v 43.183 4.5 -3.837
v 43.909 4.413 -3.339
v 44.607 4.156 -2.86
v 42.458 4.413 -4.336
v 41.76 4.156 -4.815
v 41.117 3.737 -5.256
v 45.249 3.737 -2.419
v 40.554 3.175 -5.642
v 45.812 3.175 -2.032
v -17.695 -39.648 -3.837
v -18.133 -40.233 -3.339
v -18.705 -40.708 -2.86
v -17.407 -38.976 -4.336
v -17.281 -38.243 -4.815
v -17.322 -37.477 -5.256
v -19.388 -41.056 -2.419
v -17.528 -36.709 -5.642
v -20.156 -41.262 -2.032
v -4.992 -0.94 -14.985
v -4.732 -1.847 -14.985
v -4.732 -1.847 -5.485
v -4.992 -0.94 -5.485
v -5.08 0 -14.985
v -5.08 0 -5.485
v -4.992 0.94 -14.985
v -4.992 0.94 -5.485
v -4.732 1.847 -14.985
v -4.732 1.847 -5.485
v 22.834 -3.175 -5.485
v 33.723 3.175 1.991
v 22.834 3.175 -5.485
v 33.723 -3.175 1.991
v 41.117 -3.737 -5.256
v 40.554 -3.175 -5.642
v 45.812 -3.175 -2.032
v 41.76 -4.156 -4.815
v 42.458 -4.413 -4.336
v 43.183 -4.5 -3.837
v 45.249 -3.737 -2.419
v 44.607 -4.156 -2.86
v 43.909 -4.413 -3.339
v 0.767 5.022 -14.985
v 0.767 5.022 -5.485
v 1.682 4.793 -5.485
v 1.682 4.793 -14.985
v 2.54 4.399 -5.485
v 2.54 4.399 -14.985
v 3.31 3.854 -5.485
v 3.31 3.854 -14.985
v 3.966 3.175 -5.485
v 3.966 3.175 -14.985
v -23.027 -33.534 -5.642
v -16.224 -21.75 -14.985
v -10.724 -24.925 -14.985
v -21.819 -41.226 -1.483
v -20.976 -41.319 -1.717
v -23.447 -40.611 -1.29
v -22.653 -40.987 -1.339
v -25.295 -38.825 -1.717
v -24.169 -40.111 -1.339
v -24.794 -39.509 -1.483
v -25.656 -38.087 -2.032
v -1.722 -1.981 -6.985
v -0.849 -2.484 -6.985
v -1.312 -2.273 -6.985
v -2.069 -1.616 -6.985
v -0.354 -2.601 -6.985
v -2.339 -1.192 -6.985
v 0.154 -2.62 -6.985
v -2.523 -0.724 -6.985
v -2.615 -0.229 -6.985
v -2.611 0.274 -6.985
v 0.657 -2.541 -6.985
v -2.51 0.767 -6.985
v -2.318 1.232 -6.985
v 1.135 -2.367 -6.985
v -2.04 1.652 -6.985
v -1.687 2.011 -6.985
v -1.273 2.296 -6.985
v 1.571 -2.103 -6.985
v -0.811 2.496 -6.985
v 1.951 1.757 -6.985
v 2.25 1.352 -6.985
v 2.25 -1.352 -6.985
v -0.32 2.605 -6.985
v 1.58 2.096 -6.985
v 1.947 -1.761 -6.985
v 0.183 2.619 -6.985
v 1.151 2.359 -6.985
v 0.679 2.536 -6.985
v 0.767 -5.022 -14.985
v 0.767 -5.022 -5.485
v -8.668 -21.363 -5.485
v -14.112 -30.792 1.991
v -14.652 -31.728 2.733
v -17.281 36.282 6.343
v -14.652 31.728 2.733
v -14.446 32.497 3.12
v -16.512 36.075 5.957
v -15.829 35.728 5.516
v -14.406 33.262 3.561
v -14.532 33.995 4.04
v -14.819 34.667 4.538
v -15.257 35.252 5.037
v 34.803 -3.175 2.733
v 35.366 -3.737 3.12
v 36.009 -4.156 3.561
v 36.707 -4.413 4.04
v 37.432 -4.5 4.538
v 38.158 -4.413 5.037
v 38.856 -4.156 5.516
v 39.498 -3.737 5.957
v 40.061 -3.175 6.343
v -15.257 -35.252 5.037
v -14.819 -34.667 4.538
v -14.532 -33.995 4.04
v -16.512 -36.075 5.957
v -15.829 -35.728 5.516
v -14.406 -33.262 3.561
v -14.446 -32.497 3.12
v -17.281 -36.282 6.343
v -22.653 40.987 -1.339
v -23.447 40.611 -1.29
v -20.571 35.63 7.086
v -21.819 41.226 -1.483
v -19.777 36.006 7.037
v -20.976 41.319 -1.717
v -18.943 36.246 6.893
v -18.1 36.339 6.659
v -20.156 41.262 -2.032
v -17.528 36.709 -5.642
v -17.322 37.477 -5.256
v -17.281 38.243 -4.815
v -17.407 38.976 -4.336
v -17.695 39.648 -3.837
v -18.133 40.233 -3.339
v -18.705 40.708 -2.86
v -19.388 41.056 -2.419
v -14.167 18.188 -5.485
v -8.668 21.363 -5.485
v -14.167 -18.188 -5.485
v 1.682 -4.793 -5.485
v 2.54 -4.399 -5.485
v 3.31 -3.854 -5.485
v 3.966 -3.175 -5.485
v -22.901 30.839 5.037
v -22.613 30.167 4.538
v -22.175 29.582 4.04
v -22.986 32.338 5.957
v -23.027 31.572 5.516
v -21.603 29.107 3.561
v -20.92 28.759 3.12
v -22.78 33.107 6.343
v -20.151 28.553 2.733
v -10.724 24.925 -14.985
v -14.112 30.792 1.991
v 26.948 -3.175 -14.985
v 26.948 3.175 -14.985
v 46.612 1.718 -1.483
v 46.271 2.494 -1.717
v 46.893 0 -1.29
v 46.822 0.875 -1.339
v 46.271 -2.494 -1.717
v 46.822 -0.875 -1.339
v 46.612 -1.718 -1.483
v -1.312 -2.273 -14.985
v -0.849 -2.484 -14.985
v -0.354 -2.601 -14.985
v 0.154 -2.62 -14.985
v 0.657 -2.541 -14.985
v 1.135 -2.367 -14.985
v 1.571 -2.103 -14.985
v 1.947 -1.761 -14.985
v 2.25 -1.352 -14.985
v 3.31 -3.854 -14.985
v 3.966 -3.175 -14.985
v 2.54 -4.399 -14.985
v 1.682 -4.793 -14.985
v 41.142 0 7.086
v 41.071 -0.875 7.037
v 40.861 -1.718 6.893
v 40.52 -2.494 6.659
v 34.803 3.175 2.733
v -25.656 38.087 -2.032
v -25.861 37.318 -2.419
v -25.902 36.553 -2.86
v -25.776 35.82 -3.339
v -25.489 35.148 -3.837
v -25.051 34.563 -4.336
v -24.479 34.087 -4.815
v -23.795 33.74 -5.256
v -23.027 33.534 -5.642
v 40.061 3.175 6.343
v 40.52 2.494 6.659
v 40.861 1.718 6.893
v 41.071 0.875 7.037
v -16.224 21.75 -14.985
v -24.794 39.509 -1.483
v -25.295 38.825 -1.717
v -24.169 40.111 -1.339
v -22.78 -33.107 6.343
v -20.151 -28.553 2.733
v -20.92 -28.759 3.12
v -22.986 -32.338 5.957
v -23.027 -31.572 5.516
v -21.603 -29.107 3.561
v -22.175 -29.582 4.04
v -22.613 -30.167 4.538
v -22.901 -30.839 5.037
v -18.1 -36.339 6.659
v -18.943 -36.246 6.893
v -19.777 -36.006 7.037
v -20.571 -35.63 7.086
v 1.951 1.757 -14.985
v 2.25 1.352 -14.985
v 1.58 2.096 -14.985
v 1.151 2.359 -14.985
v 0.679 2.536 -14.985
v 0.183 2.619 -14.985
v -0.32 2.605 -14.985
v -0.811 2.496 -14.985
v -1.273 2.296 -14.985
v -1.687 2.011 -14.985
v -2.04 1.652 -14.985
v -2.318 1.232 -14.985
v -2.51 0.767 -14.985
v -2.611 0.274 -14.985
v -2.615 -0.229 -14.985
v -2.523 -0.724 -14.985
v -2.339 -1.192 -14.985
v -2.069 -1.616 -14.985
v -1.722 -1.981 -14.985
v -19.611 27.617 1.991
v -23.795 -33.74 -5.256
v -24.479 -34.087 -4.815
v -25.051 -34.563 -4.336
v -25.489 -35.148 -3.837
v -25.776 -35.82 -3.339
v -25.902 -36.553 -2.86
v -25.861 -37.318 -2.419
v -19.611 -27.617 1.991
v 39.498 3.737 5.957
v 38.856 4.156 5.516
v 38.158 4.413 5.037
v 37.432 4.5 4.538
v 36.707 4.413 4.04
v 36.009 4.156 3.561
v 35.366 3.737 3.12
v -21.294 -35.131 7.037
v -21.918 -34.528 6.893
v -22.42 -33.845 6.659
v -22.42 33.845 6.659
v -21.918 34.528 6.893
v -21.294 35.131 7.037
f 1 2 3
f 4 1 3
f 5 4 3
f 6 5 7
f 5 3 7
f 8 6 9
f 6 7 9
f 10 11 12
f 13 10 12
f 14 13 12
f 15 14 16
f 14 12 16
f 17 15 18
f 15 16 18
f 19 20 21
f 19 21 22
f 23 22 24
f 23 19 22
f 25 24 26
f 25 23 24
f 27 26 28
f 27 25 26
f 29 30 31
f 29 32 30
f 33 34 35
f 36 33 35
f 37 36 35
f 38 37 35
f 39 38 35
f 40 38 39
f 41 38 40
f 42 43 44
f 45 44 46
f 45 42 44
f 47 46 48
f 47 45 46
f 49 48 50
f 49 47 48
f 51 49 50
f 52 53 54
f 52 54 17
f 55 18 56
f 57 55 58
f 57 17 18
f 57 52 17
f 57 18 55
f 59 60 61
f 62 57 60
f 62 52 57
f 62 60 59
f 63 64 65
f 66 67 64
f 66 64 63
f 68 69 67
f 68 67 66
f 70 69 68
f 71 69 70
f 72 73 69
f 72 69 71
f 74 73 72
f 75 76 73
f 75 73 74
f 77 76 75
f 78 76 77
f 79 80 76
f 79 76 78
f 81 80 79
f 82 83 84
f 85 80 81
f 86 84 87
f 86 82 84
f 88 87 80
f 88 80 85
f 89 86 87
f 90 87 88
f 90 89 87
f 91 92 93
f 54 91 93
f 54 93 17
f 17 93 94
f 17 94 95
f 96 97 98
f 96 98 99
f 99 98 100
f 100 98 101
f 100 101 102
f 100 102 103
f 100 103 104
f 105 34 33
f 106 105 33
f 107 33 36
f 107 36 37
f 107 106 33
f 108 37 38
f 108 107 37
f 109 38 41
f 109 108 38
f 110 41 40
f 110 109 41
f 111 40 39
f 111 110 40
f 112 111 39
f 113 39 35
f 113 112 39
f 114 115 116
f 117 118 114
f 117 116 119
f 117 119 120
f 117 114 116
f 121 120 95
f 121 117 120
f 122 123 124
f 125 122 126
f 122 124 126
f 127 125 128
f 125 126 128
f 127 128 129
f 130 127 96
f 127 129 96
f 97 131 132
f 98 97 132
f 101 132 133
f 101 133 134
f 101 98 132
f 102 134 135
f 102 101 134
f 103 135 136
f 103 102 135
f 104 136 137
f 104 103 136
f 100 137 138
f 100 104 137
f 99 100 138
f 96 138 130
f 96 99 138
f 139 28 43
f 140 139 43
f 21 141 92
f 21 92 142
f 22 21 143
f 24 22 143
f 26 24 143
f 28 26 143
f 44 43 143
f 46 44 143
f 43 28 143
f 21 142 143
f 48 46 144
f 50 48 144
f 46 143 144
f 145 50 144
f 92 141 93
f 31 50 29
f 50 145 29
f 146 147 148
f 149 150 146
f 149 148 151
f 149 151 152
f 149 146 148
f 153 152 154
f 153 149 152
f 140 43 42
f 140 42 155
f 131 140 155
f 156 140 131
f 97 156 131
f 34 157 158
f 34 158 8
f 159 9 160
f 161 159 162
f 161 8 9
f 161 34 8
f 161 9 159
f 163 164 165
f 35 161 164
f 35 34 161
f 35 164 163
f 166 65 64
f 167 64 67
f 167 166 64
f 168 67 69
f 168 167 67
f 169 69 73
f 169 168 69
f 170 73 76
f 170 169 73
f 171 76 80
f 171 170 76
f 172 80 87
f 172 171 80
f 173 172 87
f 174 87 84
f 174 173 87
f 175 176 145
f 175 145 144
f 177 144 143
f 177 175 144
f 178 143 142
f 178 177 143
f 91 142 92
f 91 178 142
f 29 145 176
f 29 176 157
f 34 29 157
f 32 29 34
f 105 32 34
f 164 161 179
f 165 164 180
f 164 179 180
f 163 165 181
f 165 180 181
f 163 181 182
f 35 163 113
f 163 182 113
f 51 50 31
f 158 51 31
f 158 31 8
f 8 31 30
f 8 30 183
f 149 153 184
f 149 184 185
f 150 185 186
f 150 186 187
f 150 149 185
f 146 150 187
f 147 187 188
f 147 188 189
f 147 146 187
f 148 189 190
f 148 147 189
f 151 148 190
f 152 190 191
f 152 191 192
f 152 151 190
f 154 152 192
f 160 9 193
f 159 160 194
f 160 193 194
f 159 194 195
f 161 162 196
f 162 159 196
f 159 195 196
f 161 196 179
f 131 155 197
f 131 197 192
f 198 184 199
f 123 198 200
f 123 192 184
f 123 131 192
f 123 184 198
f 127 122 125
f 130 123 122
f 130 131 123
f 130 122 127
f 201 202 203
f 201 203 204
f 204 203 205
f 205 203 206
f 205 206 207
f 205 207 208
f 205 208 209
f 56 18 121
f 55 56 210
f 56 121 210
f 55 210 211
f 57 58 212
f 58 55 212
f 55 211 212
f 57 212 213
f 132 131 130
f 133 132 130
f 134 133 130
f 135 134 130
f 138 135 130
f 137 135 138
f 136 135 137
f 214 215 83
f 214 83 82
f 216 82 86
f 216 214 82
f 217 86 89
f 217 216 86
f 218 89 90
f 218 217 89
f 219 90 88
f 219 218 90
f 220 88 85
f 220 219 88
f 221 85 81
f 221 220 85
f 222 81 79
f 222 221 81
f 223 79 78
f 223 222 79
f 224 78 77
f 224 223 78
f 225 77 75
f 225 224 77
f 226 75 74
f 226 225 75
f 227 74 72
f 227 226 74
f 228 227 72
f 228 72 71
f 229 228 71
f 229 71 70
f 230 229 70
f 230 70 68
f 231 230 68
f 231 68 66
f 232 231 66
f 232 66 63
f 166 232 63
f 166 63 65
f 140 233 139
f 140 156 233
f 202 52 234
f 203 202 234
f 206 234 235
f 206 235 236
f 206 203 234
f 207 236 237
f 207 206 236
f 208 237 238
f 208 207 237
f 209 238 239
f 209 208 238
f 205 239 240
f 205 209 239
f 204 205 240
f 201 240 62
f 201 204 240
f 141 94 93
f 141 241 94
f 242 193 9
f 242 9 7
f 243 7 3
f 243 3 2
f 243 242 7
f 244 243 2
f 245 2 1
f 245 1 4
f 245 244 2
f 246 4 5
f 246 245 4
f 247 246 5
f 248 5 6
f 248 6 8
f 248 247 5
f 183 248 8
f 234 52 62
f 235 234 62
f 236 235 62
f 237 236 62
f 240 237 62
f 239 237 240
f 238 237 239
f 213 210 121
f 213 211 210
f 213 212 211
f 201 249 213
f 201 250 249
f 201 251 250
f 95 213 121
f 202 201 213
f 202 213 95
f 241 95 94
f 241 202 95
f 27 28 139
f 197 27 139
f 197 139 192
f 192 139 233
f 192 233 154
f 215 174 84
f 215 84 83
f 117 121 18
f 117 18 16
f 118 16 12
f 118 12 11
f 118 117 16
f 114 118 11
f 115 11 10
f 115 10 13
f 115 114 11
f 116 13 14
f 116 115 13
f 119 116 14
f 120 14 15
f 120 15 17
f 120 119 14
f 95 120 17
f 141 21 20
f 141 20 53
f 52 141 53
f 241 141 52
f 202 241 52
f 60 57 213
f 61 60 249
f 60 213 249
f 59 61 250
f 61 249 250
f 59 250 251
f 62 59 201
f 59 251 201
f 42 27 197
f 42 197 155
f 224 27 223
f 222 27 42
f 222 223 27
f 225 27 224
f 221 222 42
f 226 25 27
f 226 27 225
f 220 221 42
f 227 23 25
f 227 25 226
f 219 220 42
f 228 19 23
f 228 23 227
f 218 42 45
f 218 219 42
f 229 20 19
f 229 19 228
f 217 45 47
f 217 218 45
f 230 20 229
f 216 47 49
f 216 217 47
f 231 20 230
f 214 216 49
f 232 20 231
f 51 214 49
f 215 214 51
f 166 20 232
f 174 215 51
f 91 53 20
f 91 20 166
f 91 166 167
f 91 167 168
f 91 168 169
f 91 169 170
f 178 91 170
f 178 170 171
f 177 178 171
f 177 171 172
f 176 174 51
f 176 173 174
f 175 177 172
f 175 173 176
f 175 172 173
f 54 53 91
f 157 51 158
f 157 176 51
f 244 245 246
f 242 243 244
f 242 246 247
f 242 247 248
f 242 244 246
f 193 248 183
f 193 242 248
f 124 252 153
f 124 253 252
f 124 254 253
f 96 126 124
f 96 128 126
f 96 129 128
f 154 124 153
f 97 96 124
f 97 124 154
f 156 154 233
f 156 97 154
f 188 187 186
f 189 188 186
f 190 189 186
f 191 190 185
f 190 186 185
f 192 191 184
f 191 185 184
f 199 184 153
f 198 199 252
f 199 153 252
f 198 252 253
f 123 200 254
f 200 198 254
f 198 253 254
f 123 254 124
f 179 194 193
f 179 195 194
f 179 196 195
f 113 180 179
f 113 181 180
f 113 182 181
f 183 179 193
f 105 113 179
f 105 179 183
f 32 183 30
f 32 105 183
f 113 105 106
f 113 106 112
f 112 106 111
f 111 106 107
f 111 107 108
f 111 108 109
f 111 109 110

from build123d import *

# Parameters (mm, degrees)
F1_DEPTH  = 3.175
F3_DEPTH  = 10.16
F5_DEPTH  = 21.4507239097
F6_COUNT  = 3
F8_DEPTH  = 9.5
F10_DEPTH = 9.5


with BuildPart() as f1:
    # F0 (on Front) → F1 (new body, symmetric)
    with BuildSketch(Plane.XZ):
        Polygon((0, -5.485), (0, -6.985), (2.625, -6.985), (2.625, -14.985), (26.9478585707, -14.985), (46.8930374778, -1.2901832047), (41.1420940815, 7.0855107996), (33.7226801014, 1.9911711769), (22.8343583448, -5.485), align=None)
    extrude(amount=F1_DEPTH, both=True)

    # F2 (on face) → F3 (join, through all)
    with BuildSketch(Plane(origin=(9.8755636575, 0, -14.3828053272), x_dir=(0.8243793311, 0, 0.5660377358), z_dir=(-0.5660377358, 0, 0.8243793311))):
        with BuildLine():
            Line((30.23841274, 3.175), (36.6163042411, 3.175))
            ThreePointArc((36.6163042411, 3.175), (33.4273584906, 4.5), (30.23841274, 3.175))
        make_face()
        with BuildLine():
            ThreePointArc((30.23841274, -3.175), (33.4273584906, -4.5), (36.6163042411, -3.175))
            Line((36.6163042411, -3.175), (30.23841274, -3.175))
        make_face()
        with BuildLine():
            ThreePointArc((36.6163042411, -3.175), (37.5867007389, -1.7175191589), (37.9273584906, 0))
            ThreePointArc((37.9273584906, 0), (37.5867007389, 1.7175191589), (36.6163042411, 3.175))
            Line((36.6163042411, 3.175), (30.23841274, 3.175))
            ThreePointArc((30.23841274, 3.175), (28.9273584906, 0), (30.23841274, -3.175))
            Line((30.23841274, -3.175), (36.6163042411, -3.175))
        make_face()
    extrude(amount=-F3_DEPTH)

    # F4 (on face) → F5 (cut, through all)
    with BuildSketch(Plane(origin=(9.8755636575, 0, -14.3828053272), x_dir=(0.8243793311, 0, 0.5660377358), z_dir=(-0.5660377358, 0, 0.8243793311))):
        with BuildLine():
            Line((36.6163042411, -3.175), (37.9273584906, -3.175))
            Line((37.9273584906, -3.175), (37.9273584906, 0))
            ThreePointArc((37.9273584905, 0), (37.5867007389, -1.7175191589), (36.6163042411, -3.175))
        make_face()
        with BuildLine():
            ThreePointArc((36.6163042411, 3.175), (37.5867007389, 1.7175191589), (37.9273584905, 0))
            Line((37.9273584906, 0), (37.9273584906, 3.175))
            Line((37.9273584906, 3.175), (36.6163042411, 3.175))
        make_face()
    extrude(amount=-F5_DEPTH, mode=Mode.SUBTRACT)

    # F6: F1 ×3 about axis
    f6_axis = Axis((0, 0, -2.7425), (0, 0, -1))


with BuildPart() as f1_1:
    add(f1.part)
    for i in range(1, F6_COUNT):
        add(f1.part.rotate(f6_axis, i * 360 / F6_COUNT))

    # F7 (on face) → F8 (join, through all)
    with BuildSketch(Plane(origin=(0, 0, -14.985), x_dir=(1, 0, 0), z_dir=(0, 0, -1))):
        with BuildLine():
            ThreePointArc((-1.3124999835, 2.2733166945), (1.3125000082, 2.2733166802), (2.625, 0))
            Line((2.625, 0), (2.625, 3.175))
            Line((2.625, 3.175), (3.965573729, 3.175))
            ThreePointArc((3.965573729, 3.175), (2.54, 4.3994090512), (0.7668437925, 5.0217875899))
            Line((0.7668437925, 5.0217875899), (1.437130657, 3.8608166849))
            Line((1.437130657, 3.8608166849), (-1.3124999835, 2.2733166945))
        make_face()
        with BuildLine():
            Line((2.625, -3.175), (2.625, 0))
            ThreePointArc((2.625, 0), (-1.3125000082, -2.2733166802), (-1.3124999835, 2.2733166945))
            Line((-1.3124999835, 2.2733166945), (-4.062130657, 0.6858166849))
            Line((-4.062130657, 0.6858166849), (-4.7324175215, 1.8467875899))
            ThreePointArc((-4.7324175215, 1.8467875899), (-2.54, -4.3994090512), (3.965573729, -3.175))
            Line((3.965573729, -3.175), (2.625, -3.175))
        make_face()
    extrude(amount=-F8_DEPTH)

    # F9 (on face) → F10 (join, through all)
    with BuildSketch(Plane(origin=(0, 0, -14.985), x_dir=(1, 0, 0), z_dir=(0, 0, -1))):
        with BuildLine():
            ThreePointArc((2.25, -1.3520817283), (2.5295132931, -0.70156076), (2.625, 0))
            ThreePointArc((2.625, 0), (2.5295132931, 0.70156076), (2.25, 1.3520817283))
            Line((2.25, 1.3520817283), (2.25, -1.3520817283))
        make_face()
    extrude(amount=-F10_DEPTH)


solid = f1_1.part
